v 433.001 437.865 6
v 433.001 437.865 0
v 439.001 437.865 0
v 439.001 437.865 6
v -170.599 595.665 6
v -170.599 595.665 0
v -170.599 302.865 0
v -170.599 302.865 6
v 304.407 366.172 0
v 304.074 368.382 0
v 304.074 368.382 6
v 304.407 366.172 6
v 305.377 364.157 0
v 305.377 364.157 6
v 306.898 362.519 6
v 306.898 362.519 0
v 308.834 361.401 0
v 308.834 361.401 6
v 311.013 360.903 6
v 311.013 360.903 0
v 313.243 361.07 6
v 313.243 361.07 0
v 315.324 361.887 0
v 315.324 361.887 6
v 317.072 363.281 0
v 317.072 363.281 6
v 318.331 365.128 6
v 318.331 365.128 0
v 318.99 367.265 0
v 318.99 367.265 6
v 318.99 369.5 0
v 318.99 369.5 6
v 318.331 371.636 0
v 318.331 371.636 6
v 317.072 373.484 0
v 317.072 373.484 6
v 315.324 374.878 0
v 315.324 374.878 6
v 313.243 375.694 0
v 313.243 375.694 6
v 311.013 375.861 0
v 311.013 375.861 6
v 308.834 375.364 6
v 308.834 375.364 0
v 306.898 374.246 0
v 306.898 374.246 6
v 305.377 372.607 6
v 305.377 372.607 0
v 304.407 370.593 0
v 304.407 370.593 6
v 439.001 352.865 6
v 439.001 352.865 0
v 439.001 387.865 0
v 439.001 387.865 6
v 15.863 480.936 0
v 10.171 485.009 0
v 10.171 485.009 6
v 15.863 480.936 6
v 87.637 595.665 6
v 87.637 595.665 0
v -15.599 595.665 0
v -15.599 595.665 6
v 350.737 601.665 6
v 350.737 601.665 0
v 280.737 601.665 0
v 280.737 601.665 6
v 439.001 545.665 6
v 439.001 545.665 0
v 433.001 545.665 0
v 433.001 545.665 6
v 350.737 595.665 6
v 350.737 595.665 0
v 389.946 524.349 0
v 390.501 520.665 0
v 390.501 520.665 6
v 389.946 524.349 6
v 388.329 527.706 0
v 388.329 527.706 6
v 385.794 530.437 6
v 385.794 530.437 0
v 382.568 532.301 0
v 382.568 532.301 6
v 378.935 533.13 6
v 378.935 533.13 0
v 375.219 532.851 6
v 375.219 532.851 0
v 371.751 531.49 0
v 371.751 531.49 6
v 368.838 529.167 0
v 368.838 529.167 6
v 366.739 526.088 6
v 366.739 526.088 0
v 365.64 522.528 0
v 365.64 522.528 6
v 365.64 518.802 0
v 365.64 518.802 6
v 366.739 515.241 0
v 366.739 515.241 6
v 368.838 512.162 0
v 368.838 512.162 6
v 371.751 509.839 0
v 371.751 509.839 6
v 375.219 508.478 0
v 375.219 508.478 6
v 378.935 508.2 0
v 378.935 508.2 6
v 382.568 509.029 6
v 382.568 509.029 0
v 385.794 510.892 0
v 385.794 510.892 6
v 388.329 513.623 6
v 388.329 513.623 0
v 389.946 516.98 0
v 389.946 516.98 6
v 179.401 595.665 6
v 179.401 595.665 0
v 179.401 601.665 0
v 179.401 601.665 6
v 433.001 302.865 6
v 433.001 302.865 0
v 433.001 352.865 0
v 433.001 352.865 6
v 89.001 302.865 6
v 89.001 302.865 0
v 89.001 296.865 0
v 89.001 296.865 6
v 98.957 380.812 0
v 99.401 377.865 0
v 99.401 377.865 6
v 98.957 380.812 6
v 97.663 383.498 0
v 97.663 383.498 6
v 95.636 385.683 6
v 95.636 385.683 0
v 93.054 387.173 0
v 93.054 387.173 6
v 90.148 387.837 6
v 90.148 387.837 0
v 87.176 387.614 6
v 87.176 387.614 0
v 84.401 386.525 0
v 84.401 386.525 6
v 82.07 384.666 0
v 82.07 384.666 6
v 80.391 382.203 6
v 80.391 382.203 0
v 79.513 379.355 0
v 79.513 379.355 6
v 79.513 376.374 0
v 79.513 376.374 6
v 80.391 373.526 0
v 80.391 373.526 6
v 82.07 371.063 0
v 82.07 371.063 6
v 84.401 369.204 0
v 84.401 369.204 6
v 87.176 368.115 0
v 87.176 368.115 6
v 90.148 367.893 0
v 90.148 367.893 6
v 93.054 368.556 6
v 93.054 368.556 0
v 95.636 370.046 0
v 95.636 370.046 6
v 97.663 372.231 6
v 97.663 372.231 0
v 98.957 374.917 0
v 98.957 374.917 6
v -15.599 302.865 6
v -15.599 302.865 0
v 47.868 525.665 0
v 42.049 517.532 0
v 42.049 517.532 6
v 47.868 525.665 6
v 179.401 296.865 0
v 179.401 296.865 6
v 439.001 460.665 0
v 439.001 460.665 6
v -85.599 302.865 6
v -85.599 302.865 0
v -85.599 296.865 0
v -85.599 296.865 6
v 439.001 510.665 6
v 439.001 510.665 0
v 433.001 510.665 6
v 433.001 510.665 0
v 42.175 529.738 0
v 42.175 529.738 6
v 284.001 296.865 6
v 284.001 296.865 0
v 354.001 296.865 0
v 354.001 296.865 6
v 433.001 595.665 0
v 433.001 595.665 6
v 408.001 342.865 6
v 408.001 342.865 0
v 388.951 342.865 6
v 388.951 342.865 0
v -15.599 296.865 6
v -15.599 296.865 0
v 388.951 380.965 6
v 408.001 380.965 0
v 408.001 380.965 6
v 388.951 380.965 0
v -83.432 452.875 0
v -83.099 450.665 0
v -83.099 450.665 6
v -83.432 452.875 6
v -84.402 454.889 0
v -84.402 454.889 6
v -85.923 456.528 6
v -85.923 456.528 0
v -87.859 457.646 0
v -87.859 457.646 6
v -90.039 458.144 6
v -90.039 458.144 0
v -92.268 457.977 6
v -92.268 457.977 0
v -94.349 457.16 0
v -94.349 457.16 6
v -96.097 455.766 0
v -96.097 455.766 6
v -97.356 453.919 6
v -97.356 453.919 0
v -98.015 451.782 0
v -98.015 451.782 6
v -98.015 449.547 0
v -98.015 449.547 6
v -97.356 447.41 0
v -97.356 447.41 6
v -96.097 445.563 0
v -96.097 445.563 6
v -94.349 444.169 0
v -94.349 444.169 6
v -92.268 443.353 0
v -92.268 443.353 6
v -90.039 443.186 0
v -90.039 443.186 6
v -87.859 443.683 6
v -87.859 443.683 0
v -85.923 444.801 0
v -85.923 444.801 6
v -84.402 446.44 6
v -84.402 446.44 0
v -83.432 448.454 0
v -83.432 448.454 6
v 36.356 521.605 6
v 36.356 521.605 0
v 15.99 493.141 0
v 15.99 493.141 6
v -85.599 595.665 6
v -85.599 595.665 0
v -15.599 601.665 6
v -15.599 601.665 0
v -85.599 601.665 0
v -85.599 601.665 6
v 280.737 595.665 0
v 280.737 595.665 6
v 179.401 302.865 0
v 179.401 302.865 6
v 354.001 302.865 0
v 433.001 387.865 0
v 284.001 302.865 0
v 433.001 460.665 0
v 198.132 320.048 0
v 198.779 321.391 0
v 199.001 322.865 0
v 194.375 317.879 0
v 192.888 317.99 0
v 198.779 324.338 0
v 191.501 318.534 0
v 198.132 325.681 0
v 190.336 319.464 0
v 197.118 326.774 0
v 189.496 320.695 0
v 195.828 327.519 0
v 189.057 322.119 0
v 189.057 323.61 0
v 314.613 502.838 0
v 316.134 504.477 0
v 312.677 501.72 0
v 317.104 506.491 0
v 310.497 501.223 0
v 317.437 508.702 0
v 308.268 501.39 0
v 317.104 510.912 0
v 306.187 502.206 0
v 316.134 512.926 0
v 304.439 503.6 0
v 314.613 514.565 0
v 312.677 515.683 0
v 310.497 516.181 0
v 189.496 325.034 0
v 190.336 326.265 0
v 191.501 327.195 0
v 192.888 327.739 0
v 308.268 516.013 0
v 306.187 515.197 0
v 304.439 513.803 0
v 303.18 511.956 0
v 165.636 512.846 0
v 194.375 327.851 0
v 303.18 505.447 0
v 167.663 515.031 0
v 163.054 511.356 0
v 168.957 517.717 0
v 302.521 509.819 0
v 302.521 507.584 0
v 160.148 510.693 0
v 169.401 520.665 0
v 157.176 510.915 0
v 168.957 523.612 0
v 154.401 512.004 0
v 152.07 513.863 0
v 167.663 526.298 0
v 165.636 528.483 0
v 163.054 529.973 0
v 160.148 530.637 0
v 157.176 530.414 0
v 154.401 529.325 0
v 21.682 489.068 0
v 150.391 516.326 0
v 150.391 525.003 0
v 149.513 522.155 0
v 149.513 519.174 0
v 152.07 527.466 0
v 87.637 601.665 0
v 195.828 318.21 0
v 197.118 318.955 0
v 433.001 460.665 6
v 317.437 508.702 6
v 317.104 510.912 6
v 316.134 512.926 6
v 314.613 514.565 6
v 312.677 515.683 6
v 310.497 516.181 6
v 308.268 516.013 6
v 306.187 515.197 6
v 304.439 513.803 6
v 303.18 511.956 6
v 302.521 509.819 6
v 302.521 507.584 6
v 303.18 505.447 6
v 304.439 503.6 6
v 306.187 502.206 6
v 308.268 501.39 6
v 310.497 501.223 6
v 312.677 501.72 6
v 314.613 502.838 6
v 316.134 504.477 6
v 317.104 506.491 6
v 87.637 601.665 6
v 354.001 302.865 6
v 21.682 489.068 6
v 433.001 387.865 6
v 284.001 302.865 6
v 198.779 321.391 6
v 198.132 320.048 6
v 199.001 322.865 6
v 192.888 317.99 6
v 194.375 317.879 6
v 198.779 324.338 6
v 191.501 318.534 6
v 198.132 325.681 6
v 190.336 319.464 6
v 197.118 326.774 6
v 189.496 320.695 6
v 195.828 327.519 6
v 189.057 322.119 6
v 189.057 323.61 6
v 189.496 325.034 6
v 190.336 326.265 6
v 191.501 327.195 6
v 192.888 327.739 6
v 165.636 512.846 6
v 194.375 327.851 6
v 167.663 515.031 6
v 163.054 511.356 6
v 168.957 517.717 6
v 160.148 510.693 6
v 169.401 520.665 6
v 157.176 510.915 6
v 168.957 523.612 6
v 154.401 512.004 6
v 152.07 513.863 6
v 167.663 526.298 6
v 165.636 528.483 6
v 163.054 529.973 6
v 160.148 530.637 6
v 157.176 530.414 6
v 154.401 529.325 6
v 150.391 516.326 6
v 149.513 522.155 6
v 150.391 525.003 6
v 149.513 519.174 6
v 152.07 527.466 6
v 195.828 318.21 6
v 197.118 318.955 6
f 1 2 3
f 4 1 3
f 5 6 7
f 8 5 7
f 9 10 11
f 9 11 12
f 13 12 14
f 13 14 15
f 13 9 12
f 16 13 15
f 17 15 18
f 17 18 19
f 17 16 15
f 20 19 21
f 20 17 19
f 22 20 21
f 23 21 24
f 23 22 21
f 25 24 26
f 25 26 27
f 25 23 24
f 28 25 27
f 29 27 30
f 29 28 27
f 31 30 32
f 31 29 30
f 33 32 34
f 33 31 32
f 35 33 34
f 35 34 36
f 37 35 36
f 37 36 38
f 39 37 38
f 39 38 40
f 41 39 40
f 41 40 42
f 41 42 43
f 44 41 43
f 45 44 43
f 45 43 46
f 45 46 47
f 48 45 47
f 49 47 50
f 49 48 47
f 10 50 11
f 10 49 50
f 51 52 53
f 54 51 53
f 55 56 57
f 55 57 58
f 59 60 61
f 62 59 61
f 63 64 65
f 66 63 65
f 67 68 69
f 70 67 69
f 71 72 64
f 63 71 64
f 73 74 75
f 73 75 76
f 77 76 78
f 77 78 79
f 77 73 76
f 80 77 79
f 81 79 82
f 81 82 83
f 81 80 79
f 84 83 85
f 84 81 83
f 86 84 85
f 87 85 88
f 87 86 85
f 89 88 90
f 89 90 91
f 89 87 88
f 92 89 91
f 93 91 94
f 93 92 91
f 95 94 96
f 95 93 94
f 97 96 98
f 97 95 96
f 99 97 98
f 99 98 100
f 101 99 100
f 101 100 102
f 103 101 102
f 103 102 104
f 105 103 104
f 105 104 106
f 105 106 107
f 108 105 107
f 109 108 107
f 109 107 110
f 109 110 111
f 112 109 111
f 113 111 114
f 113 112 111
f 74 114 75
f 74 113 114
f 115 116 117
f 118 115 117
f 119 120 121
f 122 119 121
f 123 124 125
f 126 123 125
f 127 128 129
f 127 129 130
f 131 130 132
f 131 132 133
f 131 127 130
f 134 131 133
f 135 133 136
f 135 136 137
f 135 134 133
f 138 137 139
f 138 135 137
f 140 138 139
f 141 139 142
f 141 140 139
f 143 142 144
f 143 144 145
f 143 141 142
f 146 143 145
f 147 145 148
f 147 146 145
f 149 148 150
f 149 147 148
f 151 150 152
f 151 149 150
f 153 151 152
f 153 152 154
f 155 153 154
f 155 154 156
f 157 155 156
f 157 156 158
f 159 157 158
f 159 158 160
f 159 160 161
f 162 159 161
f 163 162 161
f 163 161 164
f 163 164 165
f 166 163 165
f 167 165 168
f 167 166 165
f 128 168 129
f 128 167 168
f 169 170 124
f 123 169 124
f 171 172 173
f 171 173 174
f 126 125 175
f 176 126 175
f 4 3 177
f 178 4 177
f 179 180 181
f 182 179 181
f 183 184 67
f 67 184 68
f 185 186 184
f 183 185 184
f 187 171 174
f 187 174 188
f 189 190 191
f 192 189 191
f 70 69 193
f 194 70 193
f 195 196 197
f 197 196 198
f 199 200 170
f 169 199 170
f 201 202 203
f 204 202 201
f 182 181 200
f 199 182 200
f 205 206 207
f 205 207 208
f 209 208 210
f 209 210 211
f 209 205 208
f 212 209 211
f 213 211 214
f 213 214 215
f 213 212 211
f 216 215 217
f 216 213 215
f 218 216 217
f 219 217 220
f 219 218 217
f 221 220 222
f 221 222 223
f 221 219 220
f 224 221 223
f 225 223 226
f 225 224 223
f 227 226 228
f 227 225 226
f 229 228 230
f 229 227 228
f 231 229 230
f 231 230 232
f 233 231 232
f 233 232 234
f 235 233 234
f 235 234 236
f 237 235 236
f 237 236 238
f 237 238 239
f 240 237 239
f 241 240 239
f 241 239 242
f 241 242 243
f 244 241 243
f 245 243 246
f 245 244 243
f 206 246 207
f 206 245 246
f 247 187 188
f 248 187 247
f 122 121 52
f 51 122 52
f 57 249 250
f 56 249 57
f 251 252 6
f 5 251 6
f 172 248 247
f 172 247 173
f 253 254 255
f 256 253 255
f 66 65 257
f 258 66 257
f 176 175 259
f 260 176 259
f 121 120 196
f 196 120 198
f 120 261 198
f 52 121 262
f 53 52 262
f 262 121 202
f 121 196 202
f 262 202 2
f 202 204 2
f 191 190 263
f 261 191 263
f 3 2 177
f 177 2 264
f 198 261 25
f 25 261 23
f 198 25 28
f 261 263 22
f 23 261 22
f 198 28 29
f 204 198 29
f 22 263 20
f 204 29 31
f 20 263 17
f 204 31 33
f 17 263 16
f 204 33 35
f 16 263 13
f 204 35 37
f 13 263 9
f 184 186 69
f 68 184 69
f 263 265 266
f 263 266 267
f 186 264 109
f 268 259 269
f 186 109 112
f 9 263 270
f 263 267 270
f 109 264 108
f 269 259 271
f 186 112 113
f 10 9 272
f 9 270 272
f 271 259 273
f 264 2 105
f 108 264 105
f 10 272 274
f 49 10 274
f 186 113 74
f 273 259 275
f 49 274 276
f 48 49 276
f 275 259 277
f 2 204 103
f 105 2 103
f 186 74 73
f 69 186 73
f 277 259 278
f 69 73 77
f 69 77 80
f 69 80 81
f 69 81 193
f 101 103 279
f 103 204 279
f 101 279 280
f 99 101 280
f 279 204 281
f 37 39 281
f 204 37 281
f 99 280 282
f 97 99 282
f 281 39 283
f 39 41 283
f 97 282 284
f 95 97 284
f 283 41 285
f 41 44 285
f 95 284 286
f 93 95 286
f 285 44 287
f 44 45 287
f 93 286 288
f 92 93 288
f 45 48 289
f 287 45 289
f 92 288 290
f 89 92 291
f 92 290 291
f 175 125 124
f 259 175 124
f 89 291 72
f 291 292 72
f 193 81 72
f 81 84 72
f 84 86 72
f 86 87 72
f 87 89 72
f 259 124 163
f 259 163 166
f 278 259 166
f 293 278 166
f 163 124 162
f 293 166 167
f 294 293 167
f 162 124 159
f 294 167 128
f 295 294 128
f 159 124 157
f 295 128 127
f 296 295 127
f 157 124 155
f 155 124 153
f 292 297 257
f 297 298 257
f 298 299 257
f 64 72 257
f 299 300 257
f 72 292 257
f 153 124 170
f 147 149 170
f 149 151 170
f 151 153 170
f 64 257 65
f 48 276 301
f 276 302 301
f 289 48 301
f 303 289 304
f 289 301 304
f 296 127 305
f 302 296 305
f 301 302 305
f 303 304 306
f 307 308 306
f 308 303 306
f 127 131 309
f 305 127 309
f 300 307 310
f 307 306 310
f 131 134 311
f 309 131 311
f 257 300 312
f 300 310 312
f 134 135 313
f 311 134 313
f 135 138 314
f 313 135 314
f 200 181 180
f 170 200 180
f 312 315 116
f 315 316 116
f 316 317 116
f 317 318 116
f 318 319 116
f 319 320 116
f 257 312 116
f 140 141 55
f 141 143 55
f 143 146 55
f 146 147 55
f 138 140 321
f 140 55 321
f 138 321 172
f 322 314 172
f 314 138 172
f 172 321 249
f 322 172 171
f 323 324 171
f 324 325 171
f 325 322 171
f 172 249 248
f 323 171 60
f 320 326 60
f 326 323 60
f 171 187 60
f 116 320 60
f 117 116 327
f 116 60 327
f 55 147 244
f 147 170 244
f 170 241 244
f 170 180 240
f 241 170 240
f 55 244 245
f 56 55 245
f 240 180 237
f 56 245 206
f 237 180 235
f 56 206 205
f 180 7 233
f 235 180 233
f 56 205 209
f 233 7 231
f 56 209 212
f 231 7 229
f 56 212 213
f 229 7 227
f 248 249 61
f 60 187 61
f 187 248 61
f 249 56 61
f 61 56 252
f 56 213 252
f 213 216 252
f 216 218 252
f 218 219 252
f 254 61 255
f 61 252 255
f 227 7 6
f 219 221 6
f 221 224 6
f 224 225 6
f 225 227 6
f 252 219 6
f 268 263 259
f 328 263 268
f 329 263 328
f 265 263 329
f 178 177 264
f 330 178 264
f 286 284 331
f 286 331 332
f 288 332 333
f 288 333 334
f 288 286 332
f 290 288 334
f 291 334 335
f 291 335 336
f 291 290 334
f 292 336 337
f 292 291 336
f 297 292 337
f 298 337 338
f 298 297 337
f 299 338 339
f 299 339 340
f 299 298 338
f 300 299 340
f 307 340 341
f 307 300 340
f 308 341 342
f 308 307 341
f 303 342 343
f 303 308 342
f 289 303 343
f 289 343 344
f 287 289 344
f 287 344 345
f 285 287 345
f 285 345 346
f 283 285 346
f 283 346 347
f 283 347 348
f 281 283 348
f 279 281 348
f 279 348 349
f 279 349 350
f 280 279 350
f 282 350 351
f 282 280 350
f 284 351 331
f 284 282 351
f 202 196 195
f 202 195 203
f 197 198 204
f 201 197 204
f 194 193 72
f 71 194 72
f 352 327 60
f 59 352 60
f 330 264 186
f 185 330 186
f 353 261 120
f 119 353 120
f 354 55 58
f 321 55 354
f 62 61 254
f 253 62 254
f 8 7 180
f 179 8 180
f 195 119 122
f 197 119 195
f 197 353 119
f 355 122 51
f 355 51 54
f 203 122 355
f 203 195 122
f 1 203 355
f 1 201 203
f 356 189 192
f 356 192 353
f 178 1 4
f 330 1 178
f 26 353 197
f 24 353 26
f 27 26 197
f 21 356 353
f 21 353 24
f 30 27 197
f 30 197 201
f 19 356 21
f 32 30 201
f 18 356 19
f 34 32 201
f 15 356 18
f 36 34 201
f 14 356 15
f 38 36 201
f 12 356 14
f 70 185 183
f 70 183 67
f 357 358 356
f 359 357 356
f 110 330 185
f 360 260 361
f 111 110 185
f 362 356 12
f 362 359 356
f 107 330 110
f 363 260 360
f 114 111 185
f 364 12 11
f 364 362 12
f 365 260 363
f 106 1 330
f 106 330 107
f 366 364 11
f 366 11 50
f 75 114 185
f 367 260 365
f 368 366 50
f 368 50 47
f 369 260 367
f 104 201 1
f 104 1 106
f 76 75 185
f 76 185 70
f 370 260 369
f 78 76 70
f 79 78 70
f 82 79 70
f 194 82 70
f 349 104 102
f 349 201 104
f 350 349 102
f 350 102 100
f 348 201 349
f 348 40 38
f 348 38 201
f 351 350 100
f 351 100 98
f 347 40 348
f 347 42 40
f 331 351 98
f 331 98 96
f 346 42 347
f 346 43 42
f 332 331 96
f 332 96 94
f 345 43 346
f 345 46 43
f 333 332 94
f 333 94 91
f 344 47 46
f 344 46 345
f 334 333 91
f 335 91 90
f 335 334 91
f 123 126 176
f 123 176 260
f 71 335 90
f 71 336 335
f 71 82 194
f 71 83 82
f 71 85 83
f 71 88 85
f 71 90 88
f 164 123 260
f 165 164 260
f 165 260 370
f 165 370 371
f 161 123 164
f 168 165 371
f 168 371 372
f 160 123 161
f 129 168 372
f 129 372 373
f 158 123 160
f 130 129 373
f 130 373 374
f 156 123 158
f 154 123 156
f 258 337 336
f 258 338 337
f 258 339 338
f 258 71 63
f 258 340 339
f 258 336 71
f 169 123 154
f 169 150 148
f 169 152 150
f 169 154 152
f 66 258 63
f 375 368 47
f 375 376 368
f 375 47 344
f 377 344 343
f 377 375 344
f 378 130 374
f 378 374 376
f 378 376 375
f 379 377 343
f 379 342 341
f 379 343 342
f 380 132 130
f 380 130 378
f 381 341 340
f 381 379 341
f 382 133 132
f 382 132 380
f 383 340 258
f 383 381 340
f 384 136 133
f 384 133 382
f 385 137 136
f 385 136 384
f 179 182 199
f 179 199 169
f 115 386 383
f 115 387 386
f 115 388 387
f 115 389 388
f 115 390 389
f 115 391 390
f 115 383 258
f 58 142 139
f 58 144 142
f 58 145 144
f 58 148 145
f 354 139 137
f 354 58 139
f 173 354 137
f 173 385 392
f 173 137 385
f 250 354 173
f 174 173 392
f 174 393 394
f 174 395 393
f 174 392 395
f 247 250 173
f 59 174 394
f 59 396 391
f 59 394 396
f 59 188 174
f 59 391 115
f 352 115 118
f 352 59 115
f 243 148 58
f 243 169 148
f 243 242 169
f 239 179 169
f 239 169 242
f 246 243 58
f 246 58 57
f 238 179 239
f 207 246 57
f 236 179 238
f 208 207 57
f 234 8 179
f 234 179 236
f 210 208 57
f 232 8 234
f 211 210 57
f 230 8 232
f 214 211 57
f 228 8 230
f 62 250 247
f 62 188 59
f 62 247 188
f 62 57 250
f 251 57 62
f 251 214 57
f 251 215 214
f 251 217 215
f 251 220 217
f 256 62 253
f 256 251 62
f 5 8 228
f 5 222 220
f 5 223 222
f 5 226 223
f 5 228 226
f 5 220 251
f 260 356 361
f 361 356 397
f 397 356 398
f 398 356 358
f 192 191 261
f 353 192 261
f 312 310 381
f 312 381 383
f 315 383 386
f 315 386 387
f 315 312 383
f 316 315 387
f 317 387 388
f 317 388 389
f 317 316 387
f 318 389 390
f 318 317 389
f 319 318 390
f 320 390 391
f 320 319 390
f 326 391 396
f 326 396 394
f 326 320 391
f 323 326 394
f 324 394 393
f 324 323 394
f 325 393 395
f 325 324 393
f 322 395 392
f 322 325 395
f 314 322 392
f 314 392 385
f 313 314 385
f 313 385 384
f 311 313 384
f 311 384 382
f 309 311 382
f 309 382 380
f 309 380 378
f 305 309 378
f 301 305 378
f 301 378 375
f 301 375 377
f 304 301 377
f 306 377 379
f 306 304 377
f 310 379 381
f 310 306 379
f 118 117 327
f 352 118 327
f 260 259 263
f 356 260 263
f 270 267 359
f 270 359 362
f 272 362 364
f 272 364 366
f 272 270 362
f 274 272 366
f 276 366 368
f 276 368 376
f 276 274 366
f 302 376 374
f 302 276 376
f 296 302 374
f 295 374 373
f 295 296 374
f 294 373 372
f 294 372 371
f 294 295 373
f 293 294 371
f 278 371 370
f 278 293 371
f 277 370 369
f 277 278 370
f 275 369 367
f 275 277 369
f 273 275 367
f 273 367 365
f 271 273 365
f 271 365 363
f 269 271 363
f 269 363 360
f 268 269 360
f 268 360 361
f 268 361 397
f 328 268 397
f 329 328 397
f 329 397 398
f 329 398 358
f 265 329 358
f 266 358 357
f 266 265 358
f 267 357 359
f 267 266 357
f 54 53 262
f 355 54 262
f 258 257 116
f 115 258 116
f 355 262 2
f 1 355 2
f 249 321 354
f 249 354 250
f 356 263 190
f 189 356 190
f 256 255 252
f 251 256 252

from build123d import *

# Parameters (mm, degrees)
SKETCH1_R           = 7.5
SKETCH1_R_2         = 5
SKETCH1_R_3         = 10
SKETCH1_R_4         = 12.5
SKETCH1_W           = 38.1
SKETCH1_H           = 19.05
BOSS_EXTRUDE2_DEPTH = 6


with BuildPart() as part:
    # Sketch1 → Boss-Extrude2 (new body)
    with BuildSketch(Plane(origin=(0, 0, 0), x_dir=(0, 1, 0), z_dir=(0, 0, 1))):
        Polygon((302.864595387, -433.000855558), (352.864595387, -433.000855558), (352.864595387, -439.000855558), (387.864595387, -439.000855558), (387.864595387, -433.000855558), (437.864595387, -433.000855558), (437.864595387, -439.000855558), (460.664595387, -439.000855558), (460.664595387, -433.000855558), (510.664595387, -433.000855558), (510.664595387, -439.000855558), (545.664595387, -439.000855558), (545.664595387, -433.000855558), (595.664595387, -433.000855558), (595.664595387, -350.737424545), (601.664595387, -350.737424545), (601.664595387, -280.737424545), (595.664595387, -280.737424545), (595.664595387, -179.400855558), (601.664595387, -179.400855558), (601.664595387, -87.636640664), (595.664595387, -87.636640664), (595.664595387, 15.599144442), (601.664595387, 15.599144442), (601.664595387, 85.599144442), (595.664595387, 85.599144442), (595.664595387, 100.599144442), (595.664595387, 170.599144442), (525.664595387, 170.599144442), (372.864595387, 170.599144442), (302.864595387, 170.599144442), (302.864595387, 100.599144442), (302.864595387, 85.599144442), (296.864595387, 85.599144442), (296.864595387, 15.599144442), (302.864595387, 15.599144442), (302.864595387, -89.000855558), (296.864595387, -89.000855558), (296.864595387, -179.400855558), (302.864595387, -179.400855558), (302.864595387, -284.000855558), (296.864595387, -284.000855558), (296.864595387, -354.000855558), (302.864595387, -354.000855558), align=None)
        with Locations(Location((450.664595387, 90.599144442, 0), (0, 0, 270))):
            Circle(SKETCH1_R, mode=Mode.SUBTRACT)
        with Locations(Location((322.864595387, -194.000855558, 0), (0, 0, 270))):
            Circle(SKETCH1_R_2, mode=Mode.SUBTRACT)
        with Locations(Location((508.701533875, -309.936805208, 0), (0, 0, 270))):
            Circle(SKETCH1_R, mode=Mode.SUBTRACT)
        with Locations(Location((368.382345964, -311.573747263, 0), (0, 0, 90))):
            Circle(SKETCH1_R, mode=Mode.SUBTRACT)
        with Locations(Location((377.864595387, -89.400855558, 0), (0, 0, 270))):
            Circle(SKETCH1_R_3, mode=Mode.SUBTRACT)
        with Locations(Location((520.664595387, -159.400855558, 0), (0, 0, 270))):
            Circle(SKETCH1_R_3, mode=Mode.SUBTRACT)
        with Locations(Location((520.664595387, -378.000855558, 0), (0, 0, 270))):
            Circle(SKETCH1_R_4, mode=Mode.SUBTRACT)
        Polygon((480.935500713, -15.863437319), (489.068063381, -21.682494326), (493.141403286, -15.989700458), (485.008840618, -10.170643451), align=None, mode=Mode.SUBTRACT)
        Polygon((525.664595387, -47.868250858), (529.737935292, -42.17545699), (521.605372624, -36.356399983), (517.532032719, -42.04919385), align=None, mode=Mode.SUBTRACT)
        with Locations((361.914595387, -398.475855558)):
            Rectangle(SKETCH1_W, SKETCH1_H, mode=Mode.SUBTRACT)
    extrude(amount=BOSS_EXTRUDE2_DEPTH)


solid = part.part
